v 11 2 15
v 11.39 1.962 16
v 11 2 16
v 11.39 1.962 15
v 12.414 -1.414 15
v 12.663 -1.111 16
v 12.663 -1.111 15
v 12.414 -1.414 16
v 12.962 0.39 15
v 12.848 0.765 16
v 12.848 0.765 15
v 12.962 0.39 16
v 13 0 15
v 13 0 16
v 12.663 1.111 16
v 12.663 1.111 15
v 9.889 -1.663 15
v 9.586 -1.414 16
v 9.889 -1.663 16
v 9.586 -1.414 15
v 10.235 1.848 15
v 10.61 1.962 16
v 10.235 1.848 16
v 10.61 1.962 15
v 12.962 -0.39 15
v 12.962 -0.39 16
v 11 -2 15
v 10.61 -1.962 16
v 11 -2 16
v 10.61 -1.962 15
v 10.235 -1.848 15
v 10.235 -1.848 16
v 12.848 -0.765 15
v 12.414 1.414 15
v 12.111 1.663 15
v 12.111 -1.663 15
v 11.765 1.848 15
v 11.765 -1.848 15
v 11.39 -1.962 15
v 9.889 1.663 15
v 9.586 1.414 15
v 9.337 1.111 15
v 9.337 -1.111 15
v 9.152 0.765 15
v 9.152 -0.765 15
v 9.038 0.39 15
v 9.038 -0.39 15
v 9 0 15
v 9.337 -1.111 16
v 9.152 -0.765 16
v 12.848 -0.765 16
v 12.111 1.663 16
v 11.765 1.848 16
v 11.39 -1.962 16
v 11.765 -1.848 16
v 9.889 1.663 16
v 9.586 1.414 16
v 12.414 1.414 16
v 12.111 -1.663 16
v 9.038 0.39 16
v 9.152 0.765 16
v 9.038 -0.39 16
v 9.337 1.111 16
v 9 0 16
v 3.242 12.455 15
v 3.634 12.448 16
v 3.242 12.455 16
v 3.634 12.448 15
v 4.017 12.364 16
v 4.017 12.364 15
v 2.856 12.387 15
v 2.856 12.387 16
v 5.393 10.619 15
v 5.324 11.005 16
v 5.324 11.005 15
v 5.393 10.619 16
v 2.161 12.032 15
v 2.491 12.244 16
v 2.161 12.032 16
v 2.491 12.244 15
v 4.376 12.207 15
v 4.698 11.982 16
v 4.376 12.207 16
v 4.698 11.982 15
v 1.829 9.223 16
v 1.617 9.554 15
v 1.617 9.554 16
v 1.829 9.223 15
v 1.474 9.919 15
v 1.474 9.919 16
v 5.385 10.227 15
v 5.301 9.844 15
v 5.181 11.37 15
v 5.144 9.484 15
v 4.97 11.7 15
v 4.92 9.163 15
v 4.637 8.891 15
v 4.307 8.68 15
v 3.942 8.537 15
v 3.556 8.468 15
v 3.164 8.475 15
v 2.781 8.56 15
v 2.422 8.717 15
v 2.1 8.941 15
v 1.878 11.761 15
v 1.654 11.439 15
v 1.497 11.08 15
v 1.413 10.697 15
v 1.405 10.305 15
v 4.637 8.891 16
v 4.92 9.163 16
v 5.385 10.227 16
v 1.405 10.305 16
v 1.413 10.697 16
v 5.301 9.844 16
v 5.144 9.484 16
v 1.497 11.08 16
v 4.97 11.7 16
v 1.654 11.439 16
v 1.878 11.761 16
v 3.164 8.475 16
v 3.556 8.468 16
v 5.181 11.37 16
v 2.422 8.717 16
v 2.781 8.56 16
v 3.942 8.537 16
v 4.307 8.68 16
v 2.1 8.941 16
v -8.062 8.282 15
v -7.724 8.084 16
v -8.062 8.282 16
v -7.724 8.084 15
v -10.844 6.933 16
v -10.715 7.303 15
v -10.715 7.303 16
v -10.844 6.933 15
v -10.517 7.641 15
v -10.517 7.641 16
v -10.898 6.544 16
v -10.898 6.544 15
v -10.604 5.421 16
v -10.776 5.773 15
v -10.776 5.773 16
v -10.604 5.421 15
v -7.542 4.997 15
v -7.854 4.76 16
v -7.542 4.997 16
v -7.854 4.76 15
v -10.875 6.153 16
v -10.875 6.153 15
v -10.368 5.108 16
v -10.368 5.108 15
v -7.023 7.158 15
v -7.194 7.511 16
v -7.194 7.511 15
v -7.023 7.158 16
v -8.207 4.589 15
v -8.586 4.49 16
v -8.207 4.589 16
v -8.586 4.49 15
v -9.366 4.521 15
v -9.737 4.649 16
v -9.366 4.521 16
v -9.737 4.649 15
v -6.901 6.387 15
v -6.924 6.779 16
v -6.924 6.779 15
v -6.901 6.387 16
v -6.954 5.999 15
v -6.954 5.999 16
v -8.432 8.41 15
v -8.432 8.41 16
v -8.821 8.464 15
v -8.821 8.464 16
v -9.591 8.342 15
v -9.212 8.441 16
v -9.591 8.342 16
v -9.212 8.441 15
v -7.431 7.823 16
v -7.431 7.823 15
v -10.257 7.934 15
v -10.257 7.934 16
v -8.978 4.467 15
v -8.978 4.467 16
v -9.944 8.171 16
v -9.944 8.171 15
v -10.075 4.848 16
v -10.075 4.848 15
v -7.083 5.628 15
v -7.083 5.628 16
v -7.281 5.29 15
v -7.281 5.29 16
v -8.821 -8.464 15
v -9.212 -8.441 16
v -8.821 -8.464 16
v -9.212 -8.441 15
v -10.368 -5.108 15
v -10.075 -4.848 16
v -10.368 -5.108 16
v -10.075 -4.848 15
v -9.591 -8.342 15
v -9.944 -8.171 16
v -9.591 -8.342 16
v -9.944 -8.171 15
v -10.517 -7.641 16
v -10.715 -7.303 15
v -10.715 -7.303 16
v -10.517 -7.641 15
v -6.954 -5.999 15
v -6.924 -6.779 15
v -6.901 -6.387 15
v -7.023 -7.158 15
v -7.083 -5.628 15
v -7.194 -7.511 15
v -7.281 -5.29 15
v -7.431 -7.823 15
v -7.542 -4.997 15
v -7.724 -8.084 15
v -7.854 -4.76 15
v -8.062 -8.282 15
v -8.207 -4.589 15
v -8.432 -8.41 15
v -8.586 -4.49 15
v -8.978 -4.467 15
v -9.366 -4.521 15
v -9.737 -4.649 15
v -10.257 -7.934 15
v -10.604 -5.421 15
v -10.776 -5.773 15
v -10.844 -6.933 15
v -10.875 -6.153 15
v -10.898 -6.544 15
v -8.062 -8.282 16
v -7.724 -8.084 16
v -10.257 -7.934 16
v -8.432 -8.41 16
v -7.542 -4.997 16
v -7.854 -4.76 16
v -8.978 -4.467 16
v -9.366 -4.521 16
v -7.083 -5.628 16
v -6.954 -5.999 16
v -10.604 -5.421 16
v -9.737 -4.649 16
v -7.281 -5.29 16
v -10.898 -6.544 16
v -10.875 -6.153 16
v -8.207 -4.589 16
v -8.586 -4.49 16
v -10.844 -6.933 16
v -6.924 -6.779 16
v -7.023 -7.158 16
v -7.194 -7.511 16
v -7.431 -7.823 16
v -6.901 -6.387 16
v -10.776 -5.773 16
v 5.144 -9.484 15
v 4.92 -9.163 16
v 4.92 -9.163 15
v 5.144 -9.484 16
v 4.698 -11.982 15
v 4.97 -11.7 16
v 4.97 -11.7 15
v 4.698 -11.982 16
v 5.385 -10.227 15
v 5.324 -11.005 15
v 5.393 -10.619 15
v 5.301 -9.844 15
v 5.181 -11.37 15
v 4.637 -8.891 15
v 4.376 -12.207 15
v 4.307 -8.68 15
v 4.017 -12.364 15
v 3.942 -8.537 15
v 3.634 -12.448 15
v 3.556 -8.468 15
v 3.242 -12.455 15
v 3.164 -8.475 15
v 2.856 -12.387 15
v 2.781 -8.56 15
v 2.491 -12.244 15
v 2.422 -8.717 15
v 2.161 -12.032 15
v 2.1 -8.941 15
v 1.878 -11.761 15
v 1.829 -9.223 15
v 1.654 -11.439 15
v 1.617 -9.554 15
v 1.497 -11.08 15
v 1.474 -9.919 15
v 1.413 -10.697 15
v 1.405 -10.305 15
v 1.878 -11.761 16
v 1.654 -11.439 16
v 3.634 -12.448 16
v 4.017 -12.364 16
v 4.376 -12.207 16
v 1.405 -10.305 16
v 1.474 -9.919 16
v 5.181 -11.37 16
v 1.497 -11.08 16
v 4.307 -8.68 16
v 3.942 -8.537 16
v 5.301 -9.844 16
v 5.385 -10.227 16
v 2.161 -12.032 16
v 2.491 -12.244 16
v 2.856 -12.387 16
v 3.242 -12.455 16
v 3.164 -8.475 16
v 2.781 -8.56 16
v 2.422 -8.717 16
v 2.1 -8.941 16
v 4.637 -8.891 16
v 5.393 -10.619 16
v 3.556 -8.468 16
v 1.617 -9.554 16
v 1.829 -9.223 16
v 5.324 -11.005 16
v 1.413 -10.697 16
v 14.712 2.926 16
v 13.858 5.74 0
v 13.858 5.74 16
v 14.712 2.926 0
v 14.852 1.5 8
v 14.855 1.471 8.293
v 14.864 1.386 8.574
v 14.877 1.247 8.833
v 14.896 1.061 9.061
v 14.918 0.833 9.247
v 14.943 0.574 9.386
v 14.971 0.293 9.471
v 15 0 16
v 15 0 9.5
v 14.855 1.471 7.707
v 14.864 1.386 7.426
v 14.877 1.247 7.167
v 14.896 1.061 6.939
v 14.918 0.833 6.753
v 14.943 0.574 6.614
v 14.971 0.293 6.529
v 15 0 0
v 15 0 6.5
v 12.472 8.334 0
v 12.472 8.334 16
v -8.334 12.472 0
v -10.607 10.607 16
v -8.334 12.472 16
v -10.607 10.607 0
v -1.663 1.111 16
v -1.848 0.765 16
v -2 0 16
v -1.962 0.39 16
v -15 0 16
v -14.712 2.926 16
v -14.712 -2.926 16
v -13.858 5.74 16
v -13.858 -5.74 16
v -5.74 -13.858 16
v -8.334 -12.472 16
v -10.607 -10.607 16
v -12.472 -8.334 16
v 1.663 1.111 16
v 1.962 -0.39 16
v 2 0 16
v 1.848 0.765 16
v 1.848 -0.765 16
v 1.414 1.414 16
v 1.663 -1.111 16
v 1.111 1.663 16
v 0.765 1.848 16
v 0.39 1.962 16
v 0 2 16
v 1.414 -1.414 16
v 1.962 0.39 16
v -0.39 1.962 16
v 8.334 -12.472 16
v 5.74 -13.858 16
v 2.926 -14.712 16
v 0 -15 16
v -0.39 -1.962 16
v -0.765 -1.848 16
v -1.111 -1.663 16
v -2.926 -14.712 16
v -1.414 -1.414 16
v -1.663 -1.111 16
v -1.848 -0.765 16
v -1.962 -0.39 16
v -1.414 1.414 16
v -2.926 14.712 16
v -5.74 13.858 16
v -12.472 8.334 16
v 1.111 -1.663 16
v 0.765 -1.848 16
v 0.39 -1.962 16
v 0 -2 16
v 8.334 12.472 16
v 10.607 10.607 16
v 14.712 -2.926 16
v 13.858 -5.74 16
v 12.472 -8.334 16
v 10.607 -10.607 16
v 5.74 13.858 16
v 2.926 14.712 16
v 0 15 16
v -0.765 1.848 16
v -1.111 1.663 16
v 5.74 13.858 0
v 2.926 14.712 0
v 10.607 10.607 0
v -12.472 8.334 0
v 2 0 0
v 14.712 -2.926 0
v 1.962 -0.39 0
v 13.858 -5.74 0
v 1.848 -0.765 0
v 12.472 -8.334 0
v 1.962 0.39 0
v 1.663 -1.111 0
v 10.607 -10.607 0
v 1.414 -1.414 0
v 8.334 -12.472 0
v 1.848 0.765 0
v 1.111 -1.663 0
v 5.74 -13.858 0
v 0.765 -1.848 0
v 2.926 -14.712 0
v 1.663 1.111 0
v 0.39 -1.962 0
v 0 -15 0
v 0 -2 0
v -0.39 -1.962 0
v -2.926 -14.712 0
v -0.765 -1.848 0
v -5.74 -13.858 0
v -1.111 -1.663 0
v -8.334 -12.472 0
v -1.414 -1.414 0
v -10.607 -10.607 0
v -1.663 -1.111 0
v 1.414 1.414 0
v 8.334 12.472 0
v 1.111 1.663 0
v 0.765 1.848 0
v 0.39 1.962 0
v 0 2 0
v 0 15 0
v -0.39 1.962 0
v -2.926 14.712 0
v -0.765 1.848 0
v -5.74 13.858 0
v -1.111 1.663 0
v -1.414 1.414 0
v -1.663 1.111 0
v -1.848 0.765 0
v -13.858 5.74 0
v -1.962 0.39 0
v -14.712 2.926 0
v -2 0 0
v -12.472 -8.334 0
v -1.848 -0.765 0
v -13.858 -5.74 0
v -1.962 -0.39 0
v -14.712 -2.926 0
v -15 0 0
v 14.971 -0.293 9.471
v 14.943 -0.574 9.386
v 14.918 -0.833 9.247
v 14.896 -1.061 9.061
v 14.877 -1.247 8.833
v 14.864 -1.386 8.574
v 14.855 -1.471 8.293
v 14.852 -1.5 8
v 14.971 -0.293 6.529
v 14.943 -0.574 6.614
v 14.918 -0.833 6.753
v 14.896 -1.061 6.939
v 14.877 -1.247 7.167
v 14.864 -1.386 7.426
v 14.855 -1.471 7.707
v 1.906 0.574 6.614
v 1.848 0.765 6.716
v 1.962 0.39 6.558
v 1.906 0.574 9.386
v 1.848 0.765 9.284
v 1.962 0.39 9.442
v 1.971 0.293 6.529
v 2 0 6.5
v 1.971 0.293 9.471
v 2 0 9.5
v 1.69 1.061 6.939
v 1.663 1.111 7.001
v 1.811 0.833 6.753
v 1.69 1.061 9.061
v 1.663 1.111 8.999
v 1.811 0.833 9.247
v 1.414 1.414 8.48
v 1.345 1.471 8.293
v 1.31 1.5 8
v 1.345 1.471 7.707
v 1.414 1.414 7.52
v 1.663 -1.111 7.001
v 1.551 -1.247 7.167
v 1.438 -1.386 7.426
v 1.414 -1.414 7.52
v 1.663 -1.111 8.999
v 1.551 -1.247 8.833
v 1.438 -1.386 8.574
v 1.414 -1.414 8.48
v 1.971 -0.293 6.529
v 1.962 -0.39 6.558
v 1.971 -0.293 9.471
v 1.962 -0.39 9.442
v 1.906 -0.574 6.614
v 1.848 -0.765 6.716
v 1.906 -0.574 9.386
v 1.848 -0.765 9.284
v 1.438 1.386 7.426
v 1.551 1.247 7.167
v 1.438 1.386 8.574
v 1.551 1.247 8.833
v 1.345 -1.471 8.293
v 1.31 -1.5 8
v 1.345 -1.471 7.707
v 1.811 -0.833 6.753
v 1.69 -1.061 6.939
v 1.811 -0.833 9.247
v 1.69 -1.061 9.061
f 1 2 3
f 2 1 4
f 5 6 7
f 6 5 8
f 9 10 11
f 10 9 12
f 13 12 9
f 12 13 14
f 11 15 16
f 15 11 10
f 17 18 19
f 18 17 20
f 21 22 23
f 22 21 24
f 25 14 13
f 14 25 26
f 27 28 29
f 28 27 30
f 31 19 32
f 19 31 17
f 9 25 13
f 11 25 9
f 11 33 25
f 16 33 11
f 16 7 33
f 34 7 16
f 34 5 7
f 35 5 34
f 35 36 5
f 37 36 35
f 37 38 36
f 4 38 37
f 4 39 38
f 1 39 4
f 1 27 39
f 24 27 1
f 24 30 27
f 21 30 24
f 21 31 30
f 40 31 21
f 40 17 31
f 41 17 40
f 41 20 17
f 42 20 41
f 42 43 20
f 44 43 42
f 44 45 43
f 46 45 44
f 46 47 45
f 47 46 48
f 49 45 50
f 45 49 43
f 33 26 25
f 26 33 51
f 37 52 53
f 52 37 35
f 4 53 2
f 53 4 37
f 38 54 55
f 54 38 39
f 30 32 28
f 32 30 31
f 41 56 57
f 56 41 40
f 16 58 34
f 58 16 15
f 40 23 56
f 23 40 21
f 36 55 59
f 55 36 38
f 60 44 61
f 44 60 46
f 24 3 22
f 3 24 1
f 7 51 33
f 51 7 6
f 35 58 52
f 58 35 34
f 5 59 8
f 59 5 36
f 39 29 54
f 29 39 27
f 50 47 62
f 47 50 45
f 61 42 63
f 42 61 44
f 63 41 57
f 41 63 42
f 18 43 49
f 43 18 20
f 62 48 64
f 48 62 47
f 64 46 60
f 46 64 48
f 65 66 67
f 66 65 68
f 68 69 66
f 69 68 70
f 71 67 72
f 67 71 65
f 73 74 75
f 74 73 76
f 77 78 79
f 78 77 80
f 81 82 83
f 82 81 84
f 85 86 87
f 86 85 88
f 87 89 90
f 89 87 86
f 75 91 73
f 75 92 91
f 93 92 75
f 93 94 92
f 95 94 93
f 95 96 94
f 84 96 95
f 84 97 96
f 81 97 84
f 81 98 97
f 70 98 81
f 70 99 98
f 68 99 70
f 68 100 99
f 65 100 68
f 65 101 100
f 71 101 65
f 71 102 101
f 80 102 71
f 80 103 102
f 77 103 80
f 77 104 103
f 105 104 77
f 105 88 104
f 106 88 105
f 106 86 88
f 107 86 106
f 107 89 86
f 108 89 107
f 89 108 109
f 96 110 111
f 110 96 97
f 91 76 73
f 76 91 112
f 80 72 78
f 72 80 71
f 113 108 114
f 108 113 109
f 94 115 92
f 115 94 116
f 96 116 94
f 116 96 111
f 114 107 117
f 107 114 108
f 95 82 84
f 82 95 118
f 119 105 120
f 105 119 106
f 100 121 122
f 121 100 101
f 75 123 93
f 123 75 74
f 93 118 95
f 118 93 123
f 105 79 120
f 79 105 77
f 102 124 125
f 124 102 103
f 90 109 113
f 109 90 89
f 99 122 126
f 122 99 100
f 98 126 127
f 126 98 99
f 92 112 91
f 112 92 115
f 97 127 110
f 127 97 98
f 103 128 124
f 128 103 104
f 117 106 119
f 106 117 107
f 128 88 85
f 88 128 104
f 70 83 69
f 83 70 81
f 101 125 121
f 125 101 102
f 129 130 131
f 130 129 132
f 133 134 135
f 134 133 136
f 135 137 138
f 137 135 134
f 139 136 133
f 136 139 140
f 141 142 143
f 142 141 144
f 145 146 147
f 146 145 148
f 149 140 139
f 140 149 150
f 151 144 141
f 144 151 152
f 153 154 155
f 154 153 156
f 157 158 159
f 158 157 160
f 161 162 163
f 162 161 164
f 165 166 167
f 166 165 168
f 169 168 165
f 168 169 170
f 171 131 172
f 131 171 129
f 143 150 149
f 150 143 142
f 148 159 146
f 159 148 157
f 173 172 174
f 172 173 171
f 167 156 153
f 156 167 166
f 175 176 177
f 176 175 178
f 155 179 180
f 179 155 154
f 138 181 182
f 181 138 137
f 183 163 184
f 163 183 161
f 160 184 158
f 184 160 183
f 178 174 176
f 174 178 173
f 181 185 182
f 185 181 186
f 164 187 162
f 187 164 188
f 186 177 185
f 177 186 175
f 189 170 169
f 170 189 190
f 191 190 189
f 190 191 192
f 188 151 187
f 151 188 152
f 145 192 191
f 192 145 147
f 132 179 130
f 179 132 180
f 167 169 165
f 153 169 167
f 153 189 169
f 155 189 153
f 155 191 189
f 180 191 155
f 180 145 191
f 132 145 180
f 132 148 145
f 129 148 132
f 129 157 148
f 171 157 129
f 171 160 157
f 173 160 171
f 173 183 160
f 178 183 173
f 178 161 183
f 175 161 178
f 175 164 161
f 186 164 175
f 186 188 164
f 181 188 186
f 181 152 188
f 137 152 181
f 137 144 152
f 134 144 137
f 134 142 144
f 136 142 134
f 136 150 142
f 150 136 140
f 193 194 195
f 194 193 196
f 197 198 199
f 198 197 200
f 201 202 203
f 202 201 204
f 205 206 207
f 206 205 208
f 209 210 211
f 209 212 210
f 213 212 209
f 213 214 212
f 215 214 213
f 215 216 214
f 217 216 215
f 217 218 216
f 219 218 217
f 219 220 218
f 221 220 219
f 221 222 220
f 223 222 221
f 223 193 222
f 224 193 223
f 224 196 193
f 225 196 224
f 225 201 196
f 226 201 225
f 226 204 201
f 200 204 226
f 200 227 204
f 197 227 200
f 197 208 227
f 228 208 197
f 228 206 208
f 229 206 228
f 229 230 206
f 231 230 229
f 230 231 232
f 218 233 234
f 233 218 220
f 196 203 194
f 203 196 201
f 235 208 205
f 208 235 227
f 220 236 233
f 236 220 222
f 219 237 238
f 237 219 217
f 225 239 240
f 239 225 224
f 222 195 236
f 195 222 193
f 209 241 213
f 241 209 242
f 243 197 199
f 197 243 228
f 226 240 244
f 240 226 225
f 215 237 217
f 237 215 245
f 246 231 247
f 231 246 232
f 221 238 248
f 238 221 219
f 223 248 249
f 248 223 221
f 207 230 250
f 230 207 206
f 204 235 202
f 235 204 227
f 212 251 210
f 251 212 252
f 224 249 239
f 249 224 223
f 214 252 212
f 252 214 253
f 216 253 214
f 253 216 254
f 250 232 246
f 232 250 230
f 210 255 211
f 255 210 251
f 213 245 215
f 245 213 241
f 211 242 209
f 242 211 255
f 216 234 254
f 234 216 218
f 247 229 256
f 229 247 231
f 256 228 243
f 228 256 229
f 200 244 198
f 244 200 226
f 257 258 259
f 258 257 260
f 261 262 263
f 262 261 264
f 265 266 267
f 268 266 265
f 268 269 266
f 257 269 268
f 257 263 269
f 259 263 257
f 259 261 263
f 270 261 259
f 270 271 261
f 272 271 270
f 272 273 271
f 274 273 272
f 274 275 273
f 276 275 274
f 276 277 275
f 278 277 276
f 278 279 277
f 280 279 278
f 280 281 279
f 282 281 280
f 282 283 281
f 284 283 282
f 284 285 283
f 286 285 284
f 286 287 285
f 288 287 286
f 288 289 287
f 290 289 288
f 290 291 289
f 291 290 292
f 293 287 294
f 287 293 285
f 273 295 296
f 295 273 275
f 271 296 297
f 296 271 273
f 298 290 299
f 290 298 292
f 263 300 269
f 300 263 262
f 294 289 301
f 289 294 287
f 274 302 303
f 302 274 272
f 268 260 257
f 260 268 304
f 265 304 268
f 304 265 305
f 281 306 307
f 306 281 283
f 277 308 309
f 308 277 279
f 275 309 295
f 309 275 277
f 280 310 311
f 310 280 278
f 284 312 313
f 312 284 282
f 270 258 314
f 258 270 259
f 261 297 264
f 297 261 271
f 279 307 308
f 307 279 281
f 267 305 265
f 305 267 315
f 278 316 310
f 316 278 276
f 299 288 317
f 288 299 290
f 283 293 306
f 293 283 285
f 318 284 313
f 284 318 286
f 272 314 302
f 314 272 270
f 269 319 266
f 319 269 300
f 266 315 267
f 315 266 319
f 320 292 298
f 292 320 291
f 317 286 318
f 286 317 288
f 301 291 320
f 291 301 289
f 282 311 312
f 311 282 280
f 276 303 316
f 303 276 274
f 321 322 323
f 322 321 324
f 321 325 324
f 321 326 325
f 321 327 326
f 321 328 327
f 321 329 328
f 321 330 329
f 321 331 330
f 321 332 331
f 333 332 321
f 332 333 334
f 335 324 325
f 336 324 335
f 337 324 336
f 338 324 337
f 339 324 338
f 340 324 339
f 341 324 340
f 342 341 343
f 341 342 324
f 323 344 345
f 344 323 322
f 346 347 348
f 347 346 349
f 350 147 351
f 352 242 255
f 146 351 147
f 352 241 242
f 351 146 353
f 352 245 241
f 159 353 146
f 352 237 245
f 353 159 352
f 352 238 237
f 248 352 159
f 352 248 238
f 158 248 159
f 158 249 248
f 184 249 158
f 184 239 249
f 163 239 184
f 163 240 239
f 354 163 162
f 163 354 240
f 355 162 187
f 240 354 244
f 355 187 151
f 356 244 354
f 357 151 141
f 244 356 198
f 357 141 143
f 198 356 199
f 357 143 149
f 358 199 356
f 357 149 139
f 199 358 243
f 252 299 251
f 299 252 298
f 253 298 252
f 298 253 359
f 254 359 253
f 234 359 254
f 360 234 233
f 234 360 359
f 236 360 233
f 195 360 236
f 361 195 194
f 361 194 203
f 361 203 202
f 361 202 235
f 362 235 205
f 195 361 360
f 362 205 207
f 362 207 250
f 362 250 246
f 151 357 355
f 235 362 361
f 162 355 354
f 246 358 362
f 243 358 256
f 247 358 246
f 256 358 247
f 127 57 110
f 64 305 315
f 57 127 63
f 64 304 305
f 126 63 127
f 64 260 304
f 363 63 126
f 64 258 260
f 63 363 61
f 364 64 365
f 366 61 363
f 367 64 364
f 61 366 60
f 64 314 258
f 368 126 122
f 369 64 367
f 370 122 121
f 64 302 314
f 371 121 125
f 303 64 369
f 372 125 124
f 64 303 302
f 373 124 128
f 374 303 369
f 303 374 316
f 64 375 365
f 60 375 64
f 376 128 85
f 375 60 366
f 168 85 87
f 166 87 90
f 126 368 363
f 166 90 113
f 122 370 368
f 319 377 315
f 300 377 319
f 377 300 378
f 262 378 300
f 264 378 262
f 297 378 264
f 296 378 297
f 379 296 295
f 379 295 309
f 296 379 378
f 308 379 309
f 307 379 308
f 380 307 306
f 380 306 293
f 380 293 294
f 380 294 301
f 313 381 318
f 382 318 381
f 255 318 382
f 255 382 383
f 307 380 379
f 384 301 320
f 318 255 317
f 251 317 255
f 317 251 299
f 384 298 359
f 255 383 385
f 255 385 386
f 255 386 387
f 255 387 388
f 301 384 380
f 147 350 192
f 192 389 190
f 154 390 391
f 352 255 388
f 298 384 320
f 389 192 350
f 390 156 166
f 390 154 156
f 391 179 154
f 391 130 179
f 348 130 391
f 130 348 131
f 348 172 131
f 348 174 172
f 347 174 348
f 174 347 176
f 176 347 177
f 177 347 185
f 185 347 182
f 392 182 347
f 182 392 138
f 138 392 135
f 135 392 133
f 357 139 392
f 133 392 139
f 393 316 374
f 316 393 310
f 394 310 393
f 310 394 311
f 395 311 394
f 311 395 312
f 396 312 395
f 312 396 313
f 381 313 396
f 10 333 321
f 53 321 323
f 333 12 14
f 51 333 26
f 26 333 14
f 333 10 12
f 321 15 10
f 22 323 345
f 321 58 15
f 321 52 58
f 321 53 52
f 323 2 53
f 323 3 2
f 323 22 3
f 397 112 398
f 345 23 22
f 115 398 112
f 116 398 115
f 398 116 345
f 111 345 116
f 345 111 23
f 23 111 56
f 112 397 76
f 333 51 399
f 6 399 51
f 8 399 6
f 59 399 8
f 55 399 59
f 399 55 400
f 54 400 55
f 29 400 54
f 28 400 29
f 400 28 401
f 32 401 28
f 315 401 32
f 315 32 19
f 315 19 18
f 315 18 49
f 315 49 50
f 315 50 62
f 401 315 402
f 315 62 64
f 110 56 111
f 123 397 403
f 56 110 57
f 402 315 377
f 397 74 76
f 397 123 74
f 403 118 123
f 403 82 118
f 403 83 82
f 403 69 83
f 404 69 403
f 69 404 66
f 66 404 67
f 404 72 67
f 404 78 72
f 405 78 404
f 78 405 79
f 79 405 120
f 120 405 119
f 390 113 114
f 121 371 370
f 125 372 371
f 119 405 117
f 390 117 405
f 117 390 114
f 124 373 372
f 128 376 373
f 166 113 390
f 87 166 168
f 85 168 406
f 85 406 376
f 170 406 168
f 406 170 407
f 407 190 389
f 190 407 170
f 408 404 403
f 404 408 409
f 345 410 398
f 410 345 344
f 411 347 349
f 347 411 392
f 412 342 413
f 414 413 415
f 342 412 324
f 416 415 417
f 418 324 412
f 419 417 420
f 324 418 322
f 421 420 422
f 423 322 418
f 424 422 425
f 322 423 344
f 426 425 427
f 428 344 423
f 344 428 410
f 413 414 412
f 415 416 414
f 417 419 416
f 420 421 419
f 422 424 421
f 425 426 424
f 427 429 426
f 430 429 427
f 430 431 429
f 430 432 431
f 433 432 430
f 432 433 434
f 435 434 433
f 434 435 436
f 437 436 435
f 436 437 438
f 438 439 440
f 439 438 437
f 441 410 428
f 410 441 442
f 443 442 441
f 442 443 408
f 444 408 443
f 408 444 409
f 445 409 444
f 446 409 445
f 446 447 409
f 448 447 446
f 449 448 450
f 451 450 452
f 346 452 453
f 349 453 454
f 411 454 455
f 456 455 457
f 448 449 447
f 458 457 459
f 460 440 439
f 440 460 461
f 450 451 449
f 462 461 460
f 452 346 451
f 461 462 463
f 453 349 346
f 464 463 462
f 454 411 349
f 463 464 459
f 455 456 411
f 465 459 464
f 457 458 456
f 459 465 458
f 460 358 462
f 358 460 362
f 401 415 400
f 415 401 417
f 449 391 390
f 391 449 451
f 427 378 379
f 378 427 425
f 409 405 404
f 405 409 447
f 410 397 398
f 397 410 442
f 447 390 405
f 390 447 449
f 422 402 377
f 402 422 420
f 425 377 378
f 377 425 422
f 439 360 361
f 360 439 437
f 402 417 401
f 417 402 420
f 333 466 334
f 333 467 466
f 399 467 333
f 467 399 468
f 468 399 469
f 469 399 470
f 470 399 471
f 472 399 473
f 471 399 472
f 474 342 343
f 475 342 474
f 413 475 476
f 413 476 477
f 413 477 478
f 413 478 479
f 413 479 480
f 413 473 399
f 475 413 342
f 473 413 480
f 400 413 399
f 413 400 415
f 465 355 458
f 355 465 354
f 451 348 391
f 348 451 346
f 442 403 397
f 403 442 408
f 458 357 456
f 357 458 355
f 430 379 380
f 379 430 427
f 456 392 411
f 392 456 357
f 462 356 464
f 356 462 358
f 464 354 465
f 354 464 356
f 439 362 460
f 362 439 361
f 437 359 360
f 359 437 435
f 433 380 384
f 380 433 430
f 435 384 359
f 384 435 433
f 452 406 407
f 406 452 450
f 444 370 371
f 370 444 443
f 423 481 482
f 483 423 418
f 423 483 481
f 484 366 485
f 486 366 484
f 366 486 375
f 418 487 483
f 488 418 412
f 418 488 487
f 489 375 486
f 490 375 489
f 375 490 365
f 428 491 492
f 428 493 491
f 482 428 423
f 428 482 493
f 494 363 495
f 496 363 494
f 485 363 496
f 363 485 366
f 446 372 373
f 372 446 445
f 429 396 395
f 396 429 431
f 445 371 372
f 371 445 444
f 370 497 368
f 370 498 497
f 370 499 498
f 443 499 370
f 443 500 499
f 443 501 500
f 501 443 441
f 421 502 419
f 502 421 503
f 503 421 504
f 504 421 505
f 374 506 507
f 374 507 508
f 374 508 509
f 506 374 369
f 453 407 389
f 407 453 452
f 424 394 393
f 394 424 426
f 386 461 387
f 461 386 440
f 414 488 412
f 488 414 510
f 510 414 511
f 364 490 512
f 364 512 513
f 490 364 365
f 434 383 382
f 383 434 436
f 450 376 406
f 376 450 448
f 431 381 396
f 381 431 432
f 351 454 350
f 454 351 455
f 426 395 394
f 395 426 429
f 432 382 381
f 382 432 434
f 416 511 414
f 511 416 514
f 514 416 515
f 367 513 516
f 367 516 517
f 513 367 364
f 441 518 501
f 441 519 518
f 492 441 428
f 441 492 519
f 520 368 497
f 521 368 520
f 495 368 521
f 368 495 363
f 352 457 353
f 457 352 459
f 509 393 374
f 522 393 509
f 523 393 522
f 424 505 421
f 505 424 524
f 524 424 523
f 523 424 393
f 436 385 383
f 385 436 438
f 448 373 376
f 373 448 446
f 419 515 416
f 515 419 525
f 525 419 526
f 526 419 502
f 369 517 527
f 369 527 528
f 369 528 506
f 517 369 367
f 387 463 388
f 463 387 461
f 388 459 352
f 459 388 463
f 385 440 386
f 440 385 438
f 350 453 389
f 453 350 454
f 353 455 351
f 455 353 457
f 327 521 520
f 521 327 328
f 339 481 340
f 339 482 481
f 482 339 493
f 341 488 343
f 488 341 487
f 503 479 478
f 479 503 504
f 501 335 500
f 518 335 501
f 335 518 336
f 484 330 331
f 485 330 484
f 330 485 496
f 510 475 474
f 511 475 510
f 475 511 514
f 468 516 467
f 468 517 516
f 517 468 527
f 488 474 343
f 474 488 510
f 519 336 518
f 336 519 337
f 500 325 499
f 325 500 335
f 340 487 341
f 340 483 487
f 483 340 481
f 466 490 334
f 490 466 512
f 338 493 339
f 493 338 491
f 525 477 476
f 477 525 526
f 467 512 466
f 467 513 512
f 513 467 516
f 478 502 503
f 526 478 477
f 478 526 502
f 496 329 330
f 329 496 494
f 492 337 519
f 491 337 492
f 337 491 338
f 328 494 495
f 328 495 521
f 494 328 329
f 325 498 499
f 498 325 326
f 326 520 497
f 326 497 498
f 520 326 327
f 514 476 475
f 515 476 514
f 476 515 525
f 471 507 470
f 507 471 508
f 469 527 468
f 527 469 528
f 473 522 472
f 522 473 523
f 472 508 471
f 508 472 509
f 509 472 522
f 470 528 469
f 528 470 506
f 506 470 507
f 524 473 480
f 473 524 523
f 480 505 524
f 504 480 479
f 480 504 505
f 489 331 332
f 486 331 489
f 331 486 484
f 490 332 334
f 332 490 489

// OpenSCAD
$fn = 32;

// ----------------------------------------------------------------------
// Control knob: dimpled knob
// ----------------------------------------------------------------------

// --- parameters (mm) ---
dimp_d = 4;               // finger dimple diameter
n_dimp = 5;               // number of dimples
dimp_r = 11;              // dimple ring radius
knob_d = 30;              // knob body diameter
knob_h = 16;              // knob body height
bore_d = 4;               // shaft bore diameter
set_d = 3;                // set screw bore diameter

dimp_step = 360 / n_dimp;  // dimple angular step

difference() {
  cylinder(h = knob_h, d = knob_d);
  translate([0, 0, -1]) cylinder(h = knob_h + 2, d = bore_d);
  translate([-1, 0, knob_h / 2]) rotate([0, 90, 0])
    cylinder(h = knob_d / 2 + bore_d / 2 + 2, d = set_d);  for (i = [0 : n_dimp - 1])
    rotate([0, 0, i * dimp_step])
      translate([dimp_r, 0, knob_h - 1])
        cylinder(h = 2, d = dimp_d);
}
